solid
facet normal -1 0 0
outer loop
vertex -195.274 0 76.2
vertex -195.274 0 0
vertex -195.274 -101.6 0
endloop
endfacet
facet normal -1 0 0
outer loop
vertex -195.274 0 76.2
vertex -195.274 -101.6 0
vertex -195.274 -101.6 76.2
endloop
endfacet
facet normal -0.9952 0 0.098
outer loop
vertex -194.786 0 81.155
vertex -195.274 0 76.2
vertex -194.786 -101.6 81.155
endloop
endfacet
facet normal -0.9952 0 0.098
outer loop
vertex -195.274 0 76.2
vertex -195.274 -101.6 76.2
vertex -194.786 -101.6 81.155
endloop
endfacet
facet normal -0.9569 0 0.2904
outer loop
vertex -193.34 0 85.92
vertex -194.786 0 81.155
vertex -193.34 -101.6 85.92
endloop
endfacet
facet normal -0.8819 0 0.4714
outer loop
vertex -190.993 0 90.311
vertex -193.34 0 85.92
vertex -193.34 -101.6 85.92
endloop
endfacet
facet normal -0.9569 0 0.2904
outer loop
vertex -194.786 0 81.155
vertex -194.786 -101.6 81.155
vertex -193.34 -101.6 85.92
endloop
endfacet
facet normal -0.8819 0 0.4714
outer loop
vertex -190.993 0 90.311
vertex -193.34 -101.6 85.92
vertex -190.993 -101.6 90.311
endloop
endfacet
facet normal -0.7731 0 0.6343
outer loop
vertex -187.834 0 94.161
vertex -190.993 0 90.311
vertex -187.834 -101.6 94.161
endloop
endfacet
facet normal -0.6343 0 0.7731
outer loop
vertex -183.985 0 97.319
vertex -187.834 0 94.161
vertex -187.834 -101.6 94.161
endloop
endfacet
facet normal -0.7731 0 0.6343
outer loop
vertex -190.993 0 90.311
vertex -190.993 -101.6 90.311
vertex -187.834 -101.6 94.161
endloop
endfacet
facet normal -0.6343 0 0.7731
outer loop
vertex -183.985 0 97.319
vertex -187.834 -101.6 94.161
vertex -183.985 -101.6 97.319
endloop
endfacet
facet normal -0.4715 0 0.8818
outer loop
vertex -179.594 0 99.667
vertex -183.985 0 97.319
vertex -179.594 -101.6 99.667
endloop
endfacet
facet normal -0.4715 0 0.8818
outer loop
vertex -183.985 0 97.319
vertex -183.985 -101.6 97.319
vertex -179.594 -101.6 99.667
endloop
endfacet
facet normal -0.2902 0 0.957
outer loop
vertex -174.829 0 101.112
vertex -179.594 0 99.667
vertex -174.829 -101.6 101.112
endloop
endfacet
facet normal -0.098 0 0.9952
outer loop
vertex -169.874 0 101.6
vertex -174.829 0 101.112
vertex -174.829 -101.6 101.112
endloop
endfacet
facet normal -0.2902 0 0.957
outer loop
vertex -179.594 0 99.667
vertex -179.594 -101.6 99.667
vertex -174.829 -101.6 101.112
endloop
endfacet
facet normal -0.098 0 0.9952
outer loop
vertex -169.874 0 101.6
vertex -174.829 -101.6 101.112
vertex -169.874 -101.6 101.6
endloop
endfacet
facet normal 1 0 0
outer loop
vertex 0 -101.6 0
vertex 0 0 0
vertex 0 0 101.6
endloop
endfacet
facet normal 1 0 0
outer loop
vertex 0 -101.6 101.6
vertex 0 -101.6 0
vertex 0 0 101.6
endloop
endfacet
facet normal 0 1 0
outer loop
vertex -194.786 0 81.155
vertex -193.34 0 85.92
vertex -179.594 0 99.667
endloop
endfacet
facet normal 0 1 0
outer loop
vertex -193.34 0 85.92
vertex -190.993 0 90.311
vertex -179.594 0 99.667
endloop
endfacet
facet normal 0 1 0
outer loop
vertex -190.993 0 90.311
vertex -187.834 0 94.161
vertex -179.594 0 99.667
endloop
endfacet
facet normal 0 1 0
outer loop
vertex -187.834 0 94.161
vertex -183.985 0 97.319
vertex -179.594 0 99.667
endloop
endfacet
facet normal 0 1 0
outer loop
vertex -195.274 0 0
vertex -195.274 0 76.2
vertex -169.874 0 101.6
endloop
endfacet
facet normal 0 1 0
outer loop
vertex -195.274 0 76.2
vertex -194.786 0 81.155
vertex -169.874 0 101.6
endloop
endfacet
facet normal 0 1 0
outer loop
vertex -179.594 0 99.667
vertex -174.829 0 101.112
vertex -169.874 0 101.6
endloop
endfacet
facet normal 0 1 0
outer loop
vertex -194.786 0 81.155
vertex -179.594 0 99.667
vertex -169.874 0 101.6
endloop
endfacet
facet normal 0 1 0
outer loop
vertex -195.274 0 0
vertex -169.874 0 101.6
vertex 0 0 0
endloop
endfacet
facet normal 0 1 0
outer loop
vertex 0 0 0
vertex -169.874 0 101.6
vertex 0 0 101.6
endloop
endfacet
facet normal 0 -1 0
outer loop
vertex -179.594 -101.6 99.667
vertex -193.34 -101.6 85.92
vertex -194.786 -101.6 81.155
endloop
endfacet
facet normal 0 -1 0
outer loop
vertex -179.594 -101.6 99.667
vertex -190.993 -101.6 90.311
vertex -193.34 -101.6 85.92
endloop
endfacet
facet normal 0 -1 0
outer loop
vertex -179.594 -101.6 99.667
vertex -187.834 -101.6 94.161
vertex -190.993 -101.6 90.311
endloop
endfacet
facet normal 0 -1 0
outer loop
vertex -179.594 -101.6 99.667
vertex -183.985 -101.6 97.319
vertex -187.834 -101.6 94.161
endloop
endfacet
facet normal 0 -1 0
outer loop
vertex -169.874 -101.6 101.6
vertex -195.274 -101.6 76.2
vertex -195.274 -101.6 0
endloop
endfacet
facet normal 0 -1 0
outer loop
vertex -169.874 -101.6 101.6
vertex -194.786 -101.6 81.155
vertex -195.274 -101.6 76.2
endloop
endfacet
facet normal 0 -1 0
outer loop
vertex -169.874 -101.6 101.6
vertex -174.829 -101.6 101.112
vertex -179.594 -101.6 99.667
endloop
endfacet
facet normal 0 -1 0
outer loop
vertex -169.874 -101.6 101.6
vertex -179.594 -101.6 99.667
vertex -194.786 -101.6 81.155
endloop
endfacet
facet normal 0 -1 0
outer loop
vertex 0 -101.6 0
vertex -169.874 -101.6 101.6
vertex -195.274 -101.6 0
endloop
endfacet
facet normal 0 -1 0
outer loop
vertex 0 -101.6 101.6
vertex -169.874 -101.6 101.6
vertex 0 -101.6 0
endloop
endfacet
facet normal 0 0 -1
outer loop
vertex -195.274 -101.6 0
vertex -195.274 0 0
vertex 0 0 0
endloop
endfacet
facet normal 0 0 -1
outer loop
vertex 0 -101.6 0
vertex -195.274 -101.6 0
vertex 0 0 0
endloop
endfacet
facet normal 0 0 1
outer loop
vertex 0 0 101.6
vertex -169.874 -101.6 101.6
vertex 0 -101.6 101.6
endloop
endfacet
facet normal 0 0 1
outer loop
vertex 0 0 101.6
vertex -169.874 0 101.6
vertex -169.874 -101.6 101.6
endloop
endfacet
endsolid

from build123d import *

# Parameters (mm, degrees)
F0_W     = 195.273734
F0_H     = 101.6
F1_DEPTH = 101.6
F2_W     = 38.1
F2_H     = 101.6
F3_DEPTH = 76.2
F4_R     = 25.4


with BuildPart() as f1:
    # F0 (on Front) → F1 (new body)
    with BuildSketch(Plane.XZ):
        with Locations((-97.636867, 50.8)):
            Rectangle(F0_W, F0_H)
    extrude(amount=F1_DEPTH)

    # F2 (on face) → F3 (join)
    with BuildSketch(Plane.XY.offset(101.6)):
        with Locations((-105.483266, -50.8)):
            Rectangle(F2_W, F2_H)
    extrude(amount=-F3_DEPTH)

    # F4
    f4_edges = [f1.edges().sort_by_distance(p)[0] for p in [
        (-195.273734, -50.8, 101.6),
    ]]
    fillet(f4_edges, radius=F4_R)


solid = f1.part
